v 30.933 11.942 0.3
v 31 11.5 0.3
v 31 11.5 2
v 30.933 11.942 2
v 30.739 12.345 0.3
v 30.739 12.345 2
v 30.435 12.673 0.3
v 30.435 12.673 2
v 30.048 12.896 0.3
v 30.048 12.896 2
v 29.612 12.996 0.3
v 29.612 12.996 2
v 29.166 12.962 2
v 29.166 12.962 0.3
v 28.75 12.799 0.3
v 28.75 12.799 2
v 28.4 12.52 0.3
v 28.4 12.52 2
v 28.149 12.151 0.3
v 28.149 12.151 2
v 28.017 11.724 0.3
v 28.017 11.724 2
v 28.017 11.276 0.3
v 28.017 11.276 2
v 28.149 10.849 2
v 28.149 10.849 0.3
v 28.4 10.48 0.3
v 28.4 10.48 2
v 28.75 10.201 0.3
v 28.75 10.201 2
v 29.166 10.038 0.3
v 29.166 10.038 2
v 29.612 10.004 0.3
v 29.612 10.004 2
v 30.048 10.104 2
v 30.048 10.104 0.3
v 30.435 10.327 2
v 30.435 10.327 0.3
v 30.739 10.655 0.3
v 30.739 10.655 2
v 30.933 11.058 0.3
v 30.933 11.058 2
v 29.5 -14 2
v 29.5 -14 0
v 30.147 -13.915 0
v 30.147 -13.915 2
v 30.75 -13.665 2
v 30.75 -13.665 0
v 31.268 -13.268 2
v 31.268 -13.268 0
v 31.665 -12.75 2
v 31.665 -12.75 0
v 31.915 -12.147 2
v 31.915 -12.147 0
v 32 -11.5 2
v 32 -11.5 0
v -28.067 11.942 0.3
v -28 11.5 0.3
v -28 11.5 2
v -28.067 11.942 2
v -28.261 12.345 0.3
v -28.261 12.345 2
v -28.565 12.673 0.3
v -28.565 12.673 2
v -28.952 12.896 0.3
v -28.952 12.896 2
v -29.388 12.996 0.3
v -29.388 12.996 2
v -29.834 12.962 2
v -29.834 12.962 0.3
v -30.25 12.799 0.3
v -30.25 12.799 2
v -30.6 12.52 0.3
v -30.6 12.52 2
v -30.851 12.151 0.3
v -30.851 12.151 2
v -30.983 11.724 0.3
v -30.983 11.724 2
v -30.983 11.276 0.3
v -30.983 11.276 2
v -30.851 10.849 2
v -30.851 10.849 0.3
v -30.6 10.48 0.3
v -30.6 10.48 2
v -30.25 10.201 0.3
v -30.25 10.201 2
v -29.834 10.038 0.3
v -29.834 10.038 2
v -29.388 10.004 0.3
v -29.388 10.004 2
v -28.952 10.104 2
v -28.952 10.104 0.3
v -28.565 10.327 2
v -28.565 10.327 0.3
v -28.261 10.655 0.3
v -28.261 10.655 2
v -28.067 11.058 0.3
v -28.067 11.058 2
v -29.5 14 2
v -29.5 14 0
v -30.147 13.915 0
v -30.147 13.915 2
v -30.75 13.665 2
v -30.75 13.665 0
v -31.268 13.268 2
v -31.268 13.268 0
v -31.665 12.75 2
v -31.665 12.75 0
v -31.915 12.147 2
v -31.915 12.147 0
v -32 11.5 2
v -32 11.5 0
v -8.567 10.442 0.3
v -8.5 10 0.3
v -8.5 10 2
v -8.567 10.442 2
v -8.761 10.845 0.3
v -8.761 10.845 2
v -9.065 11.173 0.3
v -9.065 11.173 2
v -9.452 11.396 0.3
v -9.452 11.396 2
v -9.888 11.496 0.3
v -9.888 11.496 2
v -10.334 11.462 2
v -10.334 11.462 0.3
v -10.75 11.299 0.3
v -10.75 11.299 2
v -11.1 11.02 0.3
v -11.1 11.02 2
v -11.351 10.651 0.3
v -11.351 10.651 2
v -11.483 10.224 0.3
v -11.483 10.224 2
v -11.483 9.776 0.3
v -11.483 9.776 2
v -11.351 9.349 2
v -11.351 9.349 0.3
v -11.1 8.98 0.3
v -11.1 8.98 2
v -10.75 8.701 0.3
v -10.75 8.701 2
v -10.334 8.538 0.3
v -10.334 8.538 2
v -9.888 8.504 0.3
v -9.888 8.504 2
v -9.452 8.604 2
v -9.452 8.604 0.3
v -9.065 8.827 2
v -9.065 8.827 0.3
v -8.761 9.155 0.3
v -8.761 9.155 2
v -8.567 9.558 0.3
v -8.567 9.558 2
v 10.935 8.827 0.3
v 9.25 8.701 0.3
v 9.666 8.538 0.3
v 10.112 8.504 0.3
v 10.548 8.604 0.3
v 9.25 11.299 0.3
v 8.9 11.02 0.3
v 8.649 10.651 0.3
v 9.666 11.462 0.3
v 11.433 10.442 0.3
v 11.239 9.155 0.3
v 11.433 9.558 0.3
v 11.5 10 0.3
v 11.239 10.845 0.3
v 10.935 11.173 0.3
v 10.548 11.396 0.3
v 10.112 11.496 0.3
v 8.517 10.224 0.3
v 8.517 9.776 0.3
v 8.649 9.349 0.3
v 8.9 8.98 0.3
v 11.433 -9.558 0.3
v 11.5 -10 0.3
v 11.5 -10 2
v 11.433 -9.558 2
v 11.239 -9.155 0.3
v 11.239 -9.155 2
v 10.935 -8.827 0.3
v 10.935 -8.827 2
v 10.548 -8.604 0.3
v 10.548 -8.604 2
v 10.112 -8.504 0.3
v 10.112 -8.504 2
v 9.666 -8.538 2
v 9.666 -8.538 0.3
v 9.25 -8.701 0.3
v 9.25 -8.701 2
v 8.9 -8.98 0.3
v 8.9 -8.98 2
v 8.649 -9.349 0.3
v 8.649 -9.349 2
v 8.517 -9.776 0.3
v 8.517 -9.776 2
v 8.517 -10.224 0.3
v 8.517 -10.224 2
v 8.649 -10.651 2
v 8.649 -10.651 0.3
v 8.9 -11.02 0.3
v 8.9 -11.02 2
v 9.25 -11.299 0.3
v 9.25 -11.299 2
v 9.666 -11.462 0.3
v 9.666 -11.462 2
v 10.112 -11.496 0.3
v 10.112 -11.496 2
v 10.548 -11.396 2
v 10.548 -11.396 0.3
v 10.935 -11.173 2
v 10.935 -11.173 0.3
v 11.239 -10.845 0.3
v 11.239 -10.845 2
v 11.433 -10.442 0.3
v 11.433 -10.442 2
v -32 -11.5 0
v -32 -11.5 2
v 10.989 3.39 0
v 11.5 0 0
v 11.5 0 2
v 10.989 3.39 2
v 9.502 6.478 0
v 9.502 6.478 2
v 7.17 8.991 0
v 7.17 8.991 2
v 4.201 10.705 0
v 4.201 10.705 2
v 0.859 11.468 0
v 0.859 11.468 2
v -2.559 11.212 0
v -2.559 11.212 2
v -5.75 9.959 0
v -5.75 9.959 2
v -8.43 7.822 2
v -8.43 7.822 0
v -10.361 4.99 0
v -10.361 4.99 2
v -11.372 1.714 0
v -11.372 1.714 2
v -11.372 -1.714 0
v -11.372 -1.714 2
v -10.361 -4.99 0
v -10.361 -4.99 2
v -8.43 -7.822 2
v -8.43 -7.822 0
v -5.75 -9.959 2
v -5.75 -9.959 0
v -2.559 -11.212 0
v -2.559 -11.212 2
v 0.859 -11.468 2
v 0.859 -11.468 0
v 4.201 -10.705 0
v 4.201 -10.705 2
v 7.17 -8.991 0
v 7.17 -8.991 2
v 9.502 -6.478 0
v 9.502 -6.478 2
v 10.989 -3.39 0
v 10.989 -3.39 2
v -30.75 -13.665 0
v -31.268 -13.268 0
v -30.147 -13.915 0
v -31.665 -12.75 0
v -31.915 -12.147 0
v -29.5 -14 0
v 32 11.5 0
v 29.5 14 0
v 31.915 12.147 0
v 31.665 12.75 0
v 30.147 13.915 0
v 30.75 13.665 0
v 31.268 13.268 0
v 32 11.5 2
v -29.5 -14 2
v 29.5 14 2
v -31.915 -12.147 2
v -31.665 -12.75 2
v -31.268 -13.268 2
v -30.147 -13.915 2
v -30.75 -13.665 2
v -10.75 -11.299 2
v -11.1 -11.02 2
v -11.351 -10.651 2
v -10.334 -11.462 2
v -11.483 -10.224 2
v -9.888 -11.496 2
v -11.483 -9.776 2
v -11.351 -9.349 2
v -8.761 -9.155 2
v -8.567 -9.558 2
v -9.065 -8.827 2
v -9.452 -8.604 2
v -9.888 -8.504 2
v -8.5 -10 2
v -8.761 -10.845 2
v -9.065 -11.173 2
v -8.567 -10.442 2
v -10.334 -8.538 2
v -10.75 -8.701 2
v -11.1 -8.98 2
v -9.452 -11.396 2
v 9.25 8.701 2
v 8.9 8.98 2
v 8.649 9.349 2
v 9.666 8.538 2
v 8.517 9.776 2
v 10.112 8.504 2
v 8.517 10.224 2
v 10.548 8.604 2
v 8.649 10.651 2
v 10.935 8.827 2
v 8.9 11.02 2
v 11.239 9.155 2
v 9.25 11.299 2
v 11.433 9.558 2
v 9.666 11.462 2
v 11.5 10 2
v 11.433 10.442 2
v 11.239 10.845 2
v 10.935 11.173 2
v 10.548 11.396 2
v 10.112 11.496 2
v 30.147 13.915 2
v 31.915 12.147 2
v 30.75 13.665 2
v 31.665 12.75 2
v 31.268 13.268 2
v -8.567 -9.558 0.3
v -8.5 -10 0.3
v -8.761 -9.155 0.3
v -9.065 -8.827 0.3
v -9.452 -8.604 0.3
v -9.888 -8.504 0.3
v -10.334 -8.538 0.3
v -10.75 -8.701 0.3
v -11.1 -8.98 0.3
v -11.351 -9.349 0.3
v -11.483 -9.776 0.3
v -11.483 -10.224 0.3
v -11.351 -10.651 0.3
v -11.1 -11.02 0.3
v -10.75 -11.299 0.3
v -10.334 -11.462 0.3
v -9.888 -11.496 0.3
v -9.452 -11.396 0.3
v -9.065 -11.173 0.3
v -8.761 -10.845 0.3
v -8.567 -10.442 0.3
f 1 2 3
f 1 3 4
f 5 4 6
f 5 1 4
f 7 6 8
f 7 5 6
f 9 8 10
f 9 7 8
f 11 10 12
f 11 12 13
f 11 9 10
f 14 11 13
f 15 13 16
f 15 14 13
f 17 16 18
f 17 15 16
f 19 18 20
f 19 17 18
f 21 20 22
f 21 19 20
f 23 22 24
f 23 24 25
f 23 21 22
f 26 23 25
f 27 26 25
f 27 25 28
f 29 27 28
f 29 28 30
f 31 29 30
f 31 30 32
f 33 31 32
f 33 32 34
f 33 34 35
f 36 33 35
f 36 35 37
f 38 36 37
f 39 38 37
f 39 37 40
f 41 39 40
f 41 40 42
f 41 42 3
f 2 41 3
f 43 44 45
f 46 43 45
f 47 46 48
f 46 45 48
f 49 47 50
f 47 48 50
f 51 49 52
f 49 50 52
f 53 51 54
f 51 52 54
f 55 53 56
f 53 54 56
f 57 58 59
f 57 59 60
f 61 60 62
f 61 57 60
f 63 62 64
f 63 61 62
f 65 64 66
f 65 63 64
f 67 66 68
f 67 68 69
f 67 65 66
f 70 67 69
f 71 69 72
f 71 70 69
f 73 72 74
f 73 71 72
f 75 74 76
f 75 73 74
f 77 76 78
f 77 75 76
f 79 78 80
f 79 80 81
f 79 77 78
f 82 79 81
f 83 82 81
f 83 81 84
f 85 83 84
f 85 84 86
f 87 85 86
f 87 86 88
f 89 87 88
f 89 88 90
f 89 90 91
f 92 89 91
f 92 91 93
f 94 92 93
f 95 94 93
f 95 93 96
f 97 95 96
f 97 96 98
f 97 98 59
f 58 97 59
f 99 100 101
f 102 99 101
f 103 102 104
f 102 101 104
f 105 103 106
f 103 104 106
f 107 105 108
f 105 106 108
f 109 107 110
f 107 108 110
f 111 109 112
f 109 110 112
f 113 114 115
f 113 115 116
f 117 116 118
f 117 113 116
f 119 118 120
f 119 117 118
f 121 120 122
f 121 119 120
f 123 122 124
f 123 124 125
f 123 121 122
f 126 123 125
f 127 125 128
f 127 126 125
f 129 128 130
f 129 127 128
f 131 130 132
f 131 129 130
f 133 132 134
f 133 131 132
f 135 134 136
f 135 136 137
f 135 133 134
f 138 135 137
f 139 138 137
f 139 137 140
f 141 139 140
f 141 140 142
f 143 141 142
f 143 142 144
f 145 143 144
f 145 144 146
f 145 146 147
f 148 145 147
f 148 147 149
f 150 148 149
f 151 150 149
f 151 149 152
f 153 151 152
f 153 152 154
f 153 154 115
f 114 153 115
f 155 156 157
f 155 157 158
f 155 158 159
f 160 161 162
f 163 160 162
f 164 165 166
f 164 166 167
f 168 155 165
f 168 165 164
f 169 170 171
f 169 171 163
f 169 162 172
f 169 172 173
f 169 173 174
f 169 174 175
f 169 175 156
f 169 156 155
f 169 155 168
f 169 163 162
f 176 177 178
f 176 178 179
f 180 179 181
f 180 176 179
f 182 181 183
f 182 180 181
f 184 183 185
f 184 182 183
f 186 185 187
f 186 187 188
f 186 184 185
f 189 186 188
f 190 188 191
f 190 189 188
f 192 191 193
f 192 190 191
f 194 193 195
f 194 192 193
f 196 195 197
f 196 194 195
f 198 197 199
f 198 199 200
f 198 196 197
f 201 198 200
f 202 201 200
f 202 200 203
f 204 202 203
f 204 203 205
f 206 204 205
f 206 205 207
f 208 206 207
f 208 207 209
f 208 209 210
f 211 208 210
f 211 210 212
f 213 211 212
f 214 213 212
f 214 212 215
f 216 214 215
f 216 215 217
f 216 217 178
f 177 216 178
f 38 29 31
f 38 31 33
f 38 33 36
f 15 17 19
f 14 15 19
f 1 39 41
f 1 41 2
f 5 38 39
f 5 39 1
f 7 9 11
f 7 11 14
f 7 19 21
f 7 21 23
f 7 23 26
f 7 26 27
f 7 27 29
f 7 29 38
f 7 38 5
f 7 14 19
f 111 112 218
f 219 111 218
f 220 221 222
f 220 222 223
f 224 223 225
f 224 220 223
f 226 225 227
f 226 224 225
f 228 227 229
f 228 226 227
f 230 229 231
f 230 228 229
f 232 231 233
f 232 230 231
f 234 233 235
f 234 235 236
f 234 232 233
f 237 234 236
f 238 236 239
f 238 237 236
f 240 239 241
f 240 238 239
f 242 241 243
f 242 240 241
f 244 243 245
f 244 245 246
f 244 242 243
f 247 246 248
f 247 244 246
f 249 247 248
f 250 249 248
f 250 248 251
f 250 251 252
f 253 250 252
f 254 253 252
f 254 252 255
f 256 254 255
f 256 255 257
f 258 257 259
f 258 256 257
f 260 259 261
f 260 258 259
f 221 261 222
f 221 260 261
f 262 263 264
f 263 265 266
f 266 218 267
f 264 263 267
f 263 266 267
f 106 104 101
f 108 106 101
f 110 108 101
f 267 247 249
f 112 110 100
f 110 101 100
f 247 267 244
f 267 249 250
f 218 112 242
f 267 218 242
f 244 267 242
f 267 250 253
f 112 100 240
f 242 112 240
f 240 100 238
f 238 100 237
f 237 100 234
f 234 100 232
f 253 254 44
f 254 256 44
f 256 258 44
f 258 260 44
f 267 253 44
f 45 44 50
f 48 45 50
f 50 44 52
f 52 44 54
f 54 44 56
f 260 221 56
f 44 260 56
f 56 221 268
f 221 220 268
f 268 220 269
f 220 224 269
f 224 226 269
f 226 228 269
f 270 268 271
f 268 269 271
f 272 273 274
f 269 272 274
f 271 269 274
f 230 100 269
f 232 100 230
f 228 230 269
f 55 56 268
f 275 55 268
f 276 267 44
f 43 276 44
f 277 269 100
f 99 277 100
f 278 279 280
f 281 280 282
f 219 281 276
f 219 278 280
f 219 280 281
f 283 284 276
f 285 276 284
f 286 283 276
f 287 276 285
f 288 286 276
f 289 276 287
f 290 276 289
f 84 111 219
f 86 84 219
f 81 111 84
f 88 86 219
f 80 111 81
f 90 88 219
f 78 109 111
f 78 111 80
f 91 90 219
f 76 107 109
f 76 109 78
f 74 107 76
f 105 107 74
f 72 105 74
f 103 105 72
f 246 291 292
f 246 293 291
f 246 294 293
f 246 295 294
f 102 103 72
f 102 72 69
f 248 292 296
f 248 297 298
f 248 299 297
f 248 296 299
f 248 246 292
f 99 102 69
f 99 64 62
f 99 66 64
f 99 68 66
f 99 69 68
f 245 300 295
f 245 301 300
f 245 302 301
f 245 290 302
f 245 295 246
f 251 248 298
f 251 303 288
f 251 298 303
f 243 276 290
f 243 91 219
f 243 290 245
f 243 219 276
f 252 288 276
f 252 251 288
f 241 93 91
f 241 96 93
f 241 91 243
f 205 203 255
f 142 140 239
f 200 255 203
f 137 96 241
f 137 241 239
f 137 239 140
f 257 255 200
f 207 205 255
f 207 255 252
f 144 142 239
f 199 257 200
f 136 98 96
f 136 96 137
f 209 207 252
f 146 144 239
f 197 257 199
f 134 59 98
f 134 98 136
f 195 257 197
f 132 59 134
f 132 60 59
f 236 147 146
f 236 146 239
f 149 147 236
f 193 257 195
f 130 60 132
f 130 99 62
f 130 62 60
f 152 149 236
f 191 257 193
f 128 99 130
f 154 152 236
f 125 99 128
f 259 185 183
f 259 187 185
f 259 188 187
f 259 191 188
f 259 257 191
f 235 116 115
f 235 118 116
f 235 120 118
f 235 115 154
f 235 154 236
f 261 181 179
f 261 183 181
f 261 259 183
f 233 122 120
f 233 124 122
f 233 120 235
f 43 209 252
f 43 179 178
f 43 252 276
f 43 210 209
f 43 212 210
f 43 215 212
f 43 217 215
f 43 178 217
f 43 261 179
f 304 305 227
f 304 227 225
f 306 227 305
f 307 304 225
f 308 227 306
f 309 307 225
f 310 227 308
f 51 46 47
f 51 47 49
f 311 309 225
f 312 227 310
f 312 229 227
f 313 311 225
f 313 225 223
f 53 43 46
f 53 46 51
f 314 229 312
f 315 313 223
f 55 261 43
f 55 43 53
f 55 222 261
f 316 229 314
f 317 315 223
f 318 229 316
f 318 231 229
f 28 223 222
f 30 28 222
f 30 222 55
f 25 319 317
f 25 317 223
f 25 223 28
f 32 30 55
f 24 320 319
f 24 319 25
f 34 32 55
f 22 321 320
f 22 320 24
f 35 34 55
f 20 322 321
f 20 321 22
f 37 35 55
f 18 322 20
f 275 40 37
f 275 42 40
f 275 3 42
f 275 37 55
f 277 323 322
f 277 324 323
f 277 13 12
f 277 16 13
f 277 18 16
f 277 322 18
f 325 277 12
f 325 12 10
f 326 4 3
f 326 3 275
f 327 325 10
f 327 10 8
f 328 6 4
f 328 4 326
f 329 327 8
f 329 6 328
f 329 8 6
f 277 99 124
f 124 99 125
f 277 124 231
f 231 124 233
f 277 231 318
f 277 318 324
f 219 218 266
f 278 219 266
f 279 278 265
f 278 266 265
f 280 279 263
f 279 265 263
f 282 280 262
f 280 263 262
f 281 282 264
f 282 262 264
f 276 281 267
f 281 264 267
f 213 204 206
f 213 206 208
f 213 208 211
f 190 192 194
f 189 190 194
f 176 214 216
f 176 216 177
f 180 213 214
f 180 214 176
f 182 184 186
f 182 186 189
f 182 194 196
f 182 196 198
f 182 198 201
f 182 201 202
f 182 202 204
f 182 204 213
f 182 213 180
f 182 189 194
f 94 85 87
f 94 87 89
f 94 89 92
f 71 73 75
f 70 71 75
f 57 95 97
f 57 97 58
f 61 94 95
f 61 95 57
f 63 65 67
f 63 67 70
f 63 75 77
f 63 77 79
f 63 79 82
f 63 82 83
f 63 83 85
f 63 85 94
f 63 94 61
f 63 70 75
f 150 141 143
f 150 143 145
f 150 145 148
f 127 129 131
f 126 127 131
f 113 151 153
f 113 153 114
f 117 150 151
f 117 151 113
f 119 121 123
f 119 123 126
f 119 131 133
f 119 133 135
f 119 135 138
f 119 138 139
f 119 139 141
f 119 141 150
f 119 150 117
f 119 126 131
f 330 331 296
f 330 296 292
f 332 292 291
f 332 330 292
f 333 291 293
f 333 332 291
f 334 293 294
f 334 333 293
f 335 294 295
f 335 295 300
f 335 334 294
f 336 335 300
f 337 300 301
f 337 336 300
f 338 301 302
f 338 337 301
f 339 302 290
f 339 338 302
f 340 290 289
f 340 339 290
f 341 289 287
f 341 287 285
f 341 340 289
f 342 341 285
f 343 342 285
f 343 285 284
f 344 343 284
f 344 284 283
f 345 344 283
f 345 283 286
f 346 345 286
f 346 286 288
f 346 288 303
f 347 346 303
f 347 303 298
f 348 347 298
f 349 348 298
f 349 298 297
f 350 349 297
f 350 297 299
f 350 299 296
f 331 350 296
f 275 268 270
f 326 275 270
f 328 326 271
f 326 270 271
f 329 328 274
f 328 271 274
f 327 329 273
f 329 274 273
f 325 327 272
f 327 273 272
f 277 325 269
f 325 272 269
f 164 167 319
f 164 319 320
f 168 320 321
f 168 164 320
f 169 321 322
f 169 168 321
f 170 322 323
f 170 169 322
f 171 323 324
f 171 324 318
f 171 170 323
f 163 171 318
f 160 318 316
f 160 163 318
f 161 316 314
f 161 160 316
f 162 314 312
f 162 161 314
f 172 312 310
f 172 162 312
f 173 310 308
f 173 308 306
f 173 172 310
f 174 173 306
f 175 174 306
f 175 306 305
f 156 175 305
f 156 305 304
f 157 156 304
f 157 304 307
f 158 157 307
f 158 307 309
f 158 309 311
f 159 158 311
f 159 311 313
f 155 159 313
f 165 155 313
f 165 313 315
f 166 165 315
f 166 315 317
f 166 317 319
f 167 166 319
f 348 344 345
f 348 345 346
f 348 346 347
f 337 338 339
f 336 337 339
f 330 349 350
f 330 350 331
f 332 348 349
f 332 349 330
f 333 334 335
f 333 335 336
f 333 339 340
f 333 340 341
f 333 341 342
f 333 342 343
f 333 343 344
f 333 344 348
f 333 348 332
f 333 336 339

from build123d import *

# Parameters (mm, degrees)
F0_R     = 1.5
F0_R_2   = 11.5
F1_DEPTH = 2
F2_DEPTH = 0.3


with BuildPart() as f1:
    # F0 (on Top) → F1 (new body)
    with BuildSketch(Plane.XY):
        with BuildLine():
            ThreePointArc((32, 11.5), (31.267767, 13.267767), (29.5, 14))
            Line((29.5, 14), (-29.5, 14))
            ThreePointArc((-29.5, 14), (-31.267767, 13.267767), (-32, 11.5))
            Line((-32, 11.5), (-32, -11.5))
            ThreePointArc((-32, -11.5), (-31.267767, -13.267767), (-29.5, -14))
            Line((-29.5, -14), (29.5, -14))
            ThreePointArc((29.5, -14), (31.267767, -13.267767), (32, -11.5))
            Line((32, -11.5), (32, 11.5))
        make_face()
        with Locations((-10, -10)):
            Circle(F0_R, mode=Mode.SUBTRACT)
        with Locations((10, -10)):
            Circle(F0_R, mode=Mode.SUBTRACT)
        with Locations((-29.5, 11.5)):
            Circle(F0_R, mode=Mode.SUBTRACT)
        with Locations((-10, 10)):
            Circle(F0_R, mode=Mode.SUBTRACT)
        Circle(F0_R_2, mode=Mode.SUBTRACT)
        with Locations((10, 10)):
            Circle(F0_R, mode=Mode.SUBTRACT)
        with Locations((29.5, 11.5)):
            Circle(F0_R, mode=Mode.SUBTRACT)
    extrude(amount=F1_DEPTH)

    # F0 (on Top) → F2 (join)
    with BuildSketch(Plane.XY):
        with Locations((-29.5, 11.5)):
            Circle(F0_R)
        with Locations((-10, 10)):
            Circle(F0_R)
        with Locations((10, 10)):
            Circle(F0_R)
        with Locations((29.5, 11.5)):
            Circle(F0_R)
        with Locations((10, -10)):
            Circle(F0_R)
        with Locations((-10, -10)):
            Circle(F0_R)
    extrude(amount=F2_DEPTH)


solid = f1.part
